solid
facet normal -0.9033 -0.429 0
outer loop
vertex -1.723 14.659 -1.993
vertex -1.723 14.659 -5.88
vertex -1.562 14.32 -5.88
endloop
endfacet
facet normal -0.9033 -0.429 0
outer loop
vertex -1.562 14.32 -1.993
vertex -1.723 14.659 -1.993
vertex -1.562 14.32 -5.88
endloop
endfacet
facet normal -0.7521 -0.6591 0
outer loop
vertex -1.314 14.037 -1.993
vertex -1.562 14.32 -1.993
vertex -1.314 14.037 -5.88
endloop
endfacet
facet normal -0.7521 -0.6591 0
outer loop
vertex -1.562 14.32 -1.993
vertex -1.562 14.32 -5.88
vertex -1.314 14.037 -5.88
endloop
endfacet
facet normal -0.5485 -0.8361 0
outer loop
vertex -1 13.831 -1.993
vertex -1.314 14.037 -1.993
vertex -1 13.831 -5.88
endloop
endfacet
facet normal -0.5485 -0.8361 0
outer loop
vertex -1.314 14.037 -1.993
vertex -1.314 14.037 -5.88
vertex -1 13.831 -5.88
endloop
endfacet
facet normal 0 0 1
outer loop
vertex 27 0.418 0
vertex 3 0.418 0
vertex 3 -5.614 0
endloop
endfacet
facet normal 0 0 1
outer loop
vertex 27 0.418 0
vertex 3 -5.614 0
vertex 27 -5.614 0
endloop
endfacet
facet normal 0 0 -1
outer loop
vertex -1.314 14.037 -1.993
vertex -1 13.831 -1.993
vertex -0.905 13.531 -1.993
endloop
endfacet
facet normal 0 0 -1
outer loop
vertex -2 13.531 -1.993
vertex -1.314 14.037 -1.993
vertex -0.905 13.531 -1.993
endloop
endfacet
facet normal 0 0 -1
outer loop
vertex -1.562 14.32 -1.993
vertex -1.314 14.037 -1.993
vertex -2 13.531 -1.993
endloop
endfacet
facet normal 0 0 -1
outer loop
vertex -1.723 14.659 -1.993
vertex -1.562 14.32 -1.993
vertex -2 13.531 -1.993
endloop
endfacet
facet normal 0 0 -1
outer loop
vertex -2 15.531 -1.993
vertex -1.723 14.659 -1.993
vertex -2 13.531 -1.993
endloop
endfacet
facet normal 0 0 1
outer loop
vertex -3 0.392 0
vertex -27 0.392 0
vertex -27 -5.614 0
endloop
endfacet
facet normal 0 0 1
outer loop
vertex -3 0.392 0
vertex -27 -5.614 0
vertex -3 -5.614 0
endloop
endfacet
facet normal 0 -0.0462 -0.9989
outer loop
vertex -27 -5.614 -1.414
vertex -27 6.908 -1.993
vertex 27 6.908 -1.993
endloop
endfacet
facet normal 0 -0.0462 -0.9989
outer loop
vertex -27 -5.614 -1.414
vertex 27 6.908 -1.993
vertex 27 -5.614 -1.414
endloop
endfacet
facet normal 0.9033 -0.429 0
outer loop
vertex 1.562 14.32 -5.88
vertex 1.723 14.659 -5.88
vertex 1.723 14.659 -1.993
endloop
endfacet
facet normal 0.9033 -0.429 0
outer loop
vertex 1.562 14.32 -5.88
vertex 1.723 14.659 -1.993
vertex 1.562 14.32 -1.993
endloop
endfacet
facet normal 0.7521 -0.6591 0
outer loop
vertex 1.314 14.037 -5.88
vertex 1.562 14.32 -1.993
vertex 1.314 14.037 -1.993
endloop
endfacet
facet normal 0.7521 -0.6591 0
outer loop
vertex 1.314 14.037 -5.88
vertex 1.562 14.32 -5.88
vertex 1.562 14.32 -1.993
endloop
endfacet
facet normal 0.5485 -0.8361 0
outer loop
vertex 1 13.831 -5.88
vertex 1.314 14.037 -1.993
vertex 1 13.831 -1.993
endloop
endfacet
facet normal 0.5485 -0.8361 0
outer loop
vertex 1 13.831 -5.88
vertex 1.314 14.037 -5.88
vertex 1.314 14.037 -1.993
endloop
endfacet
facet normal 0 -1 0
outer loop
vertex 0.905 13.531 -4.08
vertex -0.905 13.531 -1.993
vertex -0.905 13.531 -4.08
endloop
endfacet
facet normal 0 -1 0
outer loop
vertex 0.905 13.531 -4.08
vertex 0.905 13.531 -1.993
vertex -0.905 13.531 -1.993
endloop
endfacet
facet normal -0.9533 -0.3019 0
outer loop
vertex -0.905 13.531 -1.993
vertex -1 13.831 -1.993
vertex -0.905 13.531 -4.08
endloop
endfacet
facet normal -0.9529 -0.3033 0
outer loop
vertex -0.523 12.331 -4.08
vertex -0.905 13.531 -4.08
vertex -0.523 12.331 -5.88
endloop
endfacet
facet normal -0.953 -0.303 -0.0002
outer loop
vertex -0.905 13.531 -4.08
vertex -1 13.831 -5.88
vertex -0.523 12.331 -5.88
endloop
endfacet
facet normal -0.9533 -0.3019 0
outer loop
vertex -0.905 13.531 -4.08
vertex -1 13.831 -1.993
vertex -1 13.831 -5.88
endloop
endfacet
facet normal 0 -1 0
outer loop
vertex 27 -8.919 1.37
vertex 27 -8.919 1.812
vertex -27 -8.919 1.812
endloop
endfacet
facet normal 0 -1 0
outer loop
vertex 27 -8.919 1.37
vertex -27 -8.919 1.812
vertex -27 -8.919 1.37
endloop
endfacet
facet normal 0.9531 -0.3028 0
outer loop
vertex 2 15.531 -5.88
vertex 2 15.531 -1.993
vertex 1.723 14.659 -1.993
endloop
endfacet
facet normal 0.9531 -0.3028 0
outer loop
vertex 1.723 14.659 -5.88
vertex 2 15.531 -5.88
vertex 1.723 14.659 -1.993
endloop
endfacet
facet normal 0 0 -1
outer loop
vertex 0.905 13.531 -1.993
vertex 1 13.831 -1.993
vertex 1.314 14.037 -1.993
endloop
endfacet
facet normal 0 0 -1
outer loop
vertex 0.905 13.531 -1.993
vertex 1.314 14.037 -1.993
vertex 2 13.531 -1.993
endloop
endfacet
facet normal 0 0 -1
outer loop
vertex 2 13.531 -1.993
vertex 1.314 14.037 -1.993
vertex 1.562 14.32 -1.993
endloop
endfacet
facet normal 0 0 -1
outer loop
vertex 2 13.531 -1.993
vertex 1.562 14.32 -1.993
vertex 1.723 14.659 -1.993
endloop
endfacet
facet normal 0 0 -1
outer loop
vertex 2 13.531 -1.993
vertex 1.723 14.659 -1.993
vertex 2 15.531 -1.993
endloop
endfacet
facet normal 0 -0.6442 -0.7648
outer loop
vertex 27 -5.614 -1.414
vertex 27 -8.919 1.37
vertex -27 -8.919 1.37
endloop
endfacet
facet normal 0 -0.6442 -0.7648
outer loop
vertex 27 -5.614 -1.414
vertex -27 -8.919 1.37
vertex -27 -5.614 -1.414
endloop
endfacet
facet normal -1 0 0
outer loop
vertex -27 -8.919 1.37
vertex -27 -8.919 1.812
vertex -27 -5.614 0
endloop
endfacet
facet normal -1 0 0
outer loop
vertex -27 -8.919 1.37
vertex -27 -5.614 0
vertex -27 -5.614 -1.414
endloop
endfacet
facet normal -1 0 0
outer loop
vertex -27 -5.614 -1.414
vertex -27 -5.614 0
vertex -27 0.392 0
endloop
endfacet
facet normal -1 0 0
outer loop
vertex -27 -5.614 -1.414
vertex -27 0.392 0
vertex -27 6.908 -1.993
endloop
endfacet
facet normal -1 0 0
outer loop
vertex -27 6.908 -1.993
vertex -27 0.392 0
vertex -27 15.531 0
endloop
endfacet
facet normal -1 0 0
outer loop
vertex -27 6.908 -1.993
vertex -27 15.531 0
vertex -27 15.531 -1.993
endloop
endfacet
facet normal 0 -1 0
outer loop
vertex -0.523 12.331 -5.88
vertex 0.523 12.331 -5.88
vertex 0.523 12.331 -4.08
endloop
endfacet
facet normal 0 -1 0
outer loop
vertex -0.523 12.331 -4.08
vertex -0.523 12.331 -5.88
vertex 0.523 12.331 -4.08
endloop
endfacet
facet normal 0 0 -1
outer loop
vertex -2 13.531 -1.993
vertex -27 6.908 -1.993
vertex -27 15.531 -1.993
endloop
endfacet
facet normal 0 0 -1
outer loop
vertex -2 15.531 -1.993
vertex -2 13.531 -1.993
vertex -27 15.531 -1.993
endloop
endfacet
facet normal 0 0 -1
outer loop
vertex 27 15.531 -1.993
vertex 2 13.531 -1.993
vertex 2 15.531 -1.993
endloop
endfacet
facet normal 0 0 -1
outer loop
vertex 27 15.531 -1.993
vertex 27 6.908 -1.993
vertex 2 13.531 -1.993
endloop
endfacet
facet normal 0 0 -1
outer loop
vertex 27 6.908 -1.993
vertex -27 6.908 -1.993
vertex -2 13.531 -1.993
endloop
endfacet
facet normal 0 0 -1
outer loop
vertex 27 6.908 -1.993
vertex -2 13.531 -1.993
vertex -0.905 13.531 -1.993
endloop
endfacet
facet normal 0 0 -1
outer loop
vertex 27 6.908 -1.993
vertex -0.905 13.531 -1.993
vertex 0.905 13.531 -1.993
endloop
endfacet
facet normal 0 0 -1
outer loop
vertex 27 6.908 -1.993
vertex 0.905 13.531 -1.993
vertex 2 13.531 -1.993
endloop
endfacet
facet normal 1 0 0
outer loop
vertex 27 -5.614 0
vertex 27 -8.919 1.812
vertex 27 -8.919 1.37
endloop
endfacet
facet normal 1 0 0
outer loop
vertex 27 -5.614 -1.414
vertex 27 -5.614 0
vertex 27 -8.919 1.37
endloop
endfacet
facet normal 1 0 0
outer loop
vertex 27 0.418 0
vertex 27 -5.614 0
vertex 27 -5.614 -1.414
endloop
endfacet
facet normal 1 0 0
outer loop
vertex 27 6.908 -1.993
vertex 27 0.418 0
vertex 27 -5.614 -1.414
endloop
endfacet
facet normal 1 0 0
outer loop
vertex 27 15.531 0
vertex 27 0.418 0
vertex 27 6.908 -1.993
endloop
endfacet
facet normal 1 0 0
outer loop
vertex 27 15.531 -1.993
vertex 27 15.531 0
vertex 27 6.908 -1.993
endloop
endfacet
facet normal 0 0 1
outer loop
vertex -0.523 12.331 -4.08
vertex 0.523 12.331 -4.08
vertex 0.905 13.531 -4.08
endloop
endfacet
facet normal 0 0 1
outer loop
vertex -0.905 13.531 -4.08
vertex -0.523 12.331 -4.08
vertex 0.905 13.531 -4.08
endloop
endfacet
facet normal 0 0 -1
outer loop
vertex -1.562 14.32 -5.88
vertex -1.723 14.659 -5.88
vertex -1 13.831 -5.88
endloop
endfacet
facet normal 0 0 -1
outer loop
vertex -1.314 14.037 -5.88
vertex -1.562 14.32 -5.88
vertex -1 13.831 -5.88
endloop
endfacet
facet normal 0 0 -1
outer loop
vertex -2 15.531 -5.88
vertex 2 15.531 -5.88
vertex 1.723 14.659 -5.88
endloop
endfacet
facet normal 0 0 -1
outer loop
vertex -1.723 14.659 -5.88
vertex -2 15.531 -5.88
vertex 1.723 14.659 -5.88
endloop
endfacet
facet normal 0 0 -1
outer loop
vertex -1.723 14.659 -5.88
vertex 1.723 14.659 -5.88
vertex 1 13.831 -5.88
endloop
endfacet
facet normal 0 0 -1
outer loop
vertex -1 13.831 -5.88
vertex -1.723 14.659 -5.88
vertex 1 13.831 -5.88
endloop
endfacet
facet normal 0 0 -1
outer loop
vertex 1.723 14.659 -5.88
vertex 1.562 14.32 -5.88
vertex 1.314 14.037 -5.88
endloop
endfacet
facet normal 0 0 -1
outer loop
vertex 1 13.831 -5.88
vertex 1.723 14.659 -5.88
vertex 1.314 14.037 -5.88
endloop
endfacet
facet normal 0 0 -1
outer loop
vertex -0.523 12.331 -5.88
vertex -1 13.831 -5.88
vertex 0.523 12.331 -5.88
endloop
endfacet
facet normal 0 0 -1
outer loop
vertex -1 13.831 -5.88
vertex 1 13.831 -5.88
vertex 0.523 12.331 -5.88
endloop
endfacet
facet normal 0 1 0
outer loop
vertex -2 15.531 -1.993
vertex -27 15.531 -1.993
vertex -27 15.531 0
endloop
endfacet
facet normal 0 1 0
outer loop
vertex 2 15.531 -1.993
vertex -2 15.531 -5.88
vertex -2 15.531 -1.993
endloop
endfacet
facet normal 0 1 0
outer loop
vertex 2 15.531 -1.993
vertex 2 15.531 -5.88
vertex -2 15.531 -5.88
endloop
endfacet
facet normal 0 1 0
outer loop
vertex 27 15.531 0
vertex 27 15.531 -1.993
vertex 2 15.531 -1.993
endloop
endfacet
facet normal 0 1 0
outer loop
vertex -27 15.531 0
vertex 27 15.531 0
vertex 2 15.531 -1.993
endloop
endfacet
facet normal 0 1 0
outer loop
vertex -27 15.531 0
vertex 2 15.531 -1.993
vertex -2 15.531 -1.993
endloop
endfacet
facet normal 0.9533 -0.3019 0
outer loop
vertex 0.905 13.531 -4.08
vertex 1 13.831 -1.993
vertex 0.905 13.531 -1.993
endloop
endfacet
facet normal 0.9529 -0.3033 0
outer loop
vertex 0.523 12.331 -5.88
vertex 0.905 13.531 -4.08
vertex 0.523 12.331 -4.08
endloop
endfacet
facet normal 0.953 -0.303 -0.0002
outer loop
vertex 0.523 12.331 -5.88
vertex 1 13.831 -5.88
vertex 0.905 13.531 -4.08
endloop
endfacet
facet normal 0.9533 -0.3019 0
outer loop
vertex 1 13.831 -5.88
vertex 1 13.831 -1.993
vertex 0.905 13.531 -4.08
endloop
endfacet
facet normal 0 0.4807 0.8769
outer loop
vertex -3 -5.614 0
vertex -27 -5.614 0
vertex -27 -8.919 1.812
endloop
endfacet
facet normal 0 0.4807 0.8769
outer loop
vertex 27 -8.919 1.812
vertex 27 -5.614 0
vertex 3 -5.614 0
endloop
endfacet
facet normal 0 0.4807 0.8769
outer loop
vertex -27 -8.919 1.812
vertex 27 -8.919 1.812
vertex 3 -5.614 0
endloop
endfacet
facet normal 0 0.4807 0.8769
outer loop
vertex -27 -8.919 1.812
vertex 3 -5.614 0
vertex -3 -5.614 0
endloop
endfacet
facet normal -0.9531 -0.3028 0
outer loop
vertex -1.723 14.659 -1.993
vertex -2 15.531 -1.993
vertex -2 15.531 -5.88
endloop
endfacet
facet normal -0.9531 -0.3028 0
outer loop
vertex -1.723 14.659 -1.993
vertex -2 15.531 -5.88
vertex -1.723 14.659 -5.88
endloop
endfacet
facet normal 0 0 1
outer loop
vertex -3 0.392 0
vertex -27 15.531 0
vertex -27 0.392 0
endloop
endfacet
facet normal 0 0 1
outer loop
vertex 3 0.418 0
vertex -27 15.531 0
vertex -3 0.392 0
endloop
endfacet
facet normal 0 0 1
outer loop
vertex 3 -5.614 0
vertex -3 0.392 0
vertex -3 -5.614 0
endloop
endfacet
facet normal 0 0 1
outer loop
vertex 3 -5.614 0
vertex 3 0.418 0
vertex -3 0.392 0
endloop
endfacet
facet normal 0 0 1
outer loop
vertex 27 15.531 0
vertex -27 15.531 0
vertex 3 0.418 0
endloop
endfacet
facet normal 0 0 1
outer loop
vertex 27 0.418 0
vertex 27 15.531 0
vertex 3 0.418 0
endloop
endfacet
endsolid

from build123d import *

# Parameters (mm, degrees)
EXTRUDE_1_DEPTH      = 27
SKETCH_2_W           = 9
SKETCH_2_H           = 4
CUT_EXTRUDE_1_DEPTH  = 4
SKETCH_3_W           = 9
SKETCH_3_H           = 3.038101075
EXTRUDE_2_DEPTH      = 3
SKETCH_4_R           = 1.5
CUT_EXTRUDE_2_DEPTH  = 9
EXTRUDE_3_DEPTH      = 2
CUT_EXTRUDE_8_DEPTH  = 3.887469
SKETCH_8_W           = 8.610608055
SKETCH_8_H           = 13.248031464
CUT_EXTRUDE_9_DEPTH  = 54
EXTRUDE_4_DEPTH      = 54
SKETCH_12_W          = 24
SKETCH_12_H          = 6.005920689
SKETCH_12_H_2        = 6.032486627
EXTRUDE_6_DEPTH      = 2.215161
EXTRUDE_7_DEPTH      = 54
CUT_EXTRUDE_11_DEPTH = 54


with BuildPart() as part:
    # 草图1 → 凸台-拉伸1 (new body, symmetric)
    with BuildSketch(Plane(origin=(0, 0, 0), x_dir=(0, 0, -1), z_dir=(1, 0, 0))):
        Polygon((6.496390194, -5.234874936), (6.496390194, -1.191259859), (6.496390194, 1.388117725), (6.496390194, 3.400940667), (2.492073736, 5.926640843), (1.992780388, 6.907616744), (1.992780388, 8.966437233), (1.992780388, 13.434908234), (1.992780388, 15.531060696), (0, 15.531060696), (0, 13.265125064), (0, 9.02431695), (0, 5.531060696), (1.075983727, 5.531060696), (2.127060271, 3.7449116), (2.127060271, 3.316049082), (3.852001832, 3.316049082), (3.852001832, -5.234874936), align=None)
    extrude(amount=EXTRUDE_1_DEPTH, both=True)

    # 草图2 → 切除-拉伸1 (cut)
    with BuildSketch(Plane(origin=(0, 0, -6.496390194), x_dir=(-1, 0, 0), z_dir=(0, 0, -1))):
        with Locations((0, -3.734874936)):
            Rectangle(SKETCH_2_W, SKETCH_2_H)
    extrude(amount=-CUT_EXTRUDE_1_DEPTH, mode=Mode.SUBTRACT)

    # 草图3 → 凸台-拉伸2 (add)
    with BuildSketch(Plane(origin=(0, 0, -6.496390194), x_dir=(-1, 0, 0), z_dir=(0, 0, -1))):
        with Locations((0, -0.215824399)):
            Rectangle(SKETCH_3_W, SKETCH_3_H)
    extrude(amount=EXTRUDE_2_DEPTH)

    # 草图4 → 切除-拉伸2 (cut)
    with BuildSketch(Plane.XZ.offset(1.734874936)):
        with Locations((0, -6.102001832)):
            Circle(SKETCH_4_R)
    extrude(amount=-CUT_EXTRUDE_2_DEPTH, mode=Mode.SUBTRACT)

    # 草图6 → 凸台-拉伸3 (add, symmetric)
    with BuildSketch(Plane(origin=(0, 0, 0), x_dir=(0, 0, -1), z_dir=(1, 0, 0))):
        Polygon((1.880249614, 15.531060696), (5.880249614, 15.531060696), (5.880249614, 12.331060696), (4.080249614, 12.331060696), (4.080249614, 13.531060696), (2.0593477, 13.531060696), (1.880249614, 13.531060696), align=None)
    extrude(amount=EXTRUDE_3_DEPTH, both=True)

    # 草图7 → 切除-拉伸8 (cut)
    with BuildSketch(Plane(origin=(0, 0, -5.880249614), x_dir=(-1, 0, 0), z_dir=(0, 0, -1))):
        with BuildLine():
            Line((1, 13.831060696), (0.52341558, 12.331060696))
            Line((0.52341558, 12.331060696), (2, 12.331060696))
            Line((2, 12.331060696), (2, 15.531060696))
            Line((2, 15.531060696), (1.723060875, 14.659423543))
            ThreePointArc((1.723060875, 14.659423543), (1.447645575, 14.170073989), (1, 13.831060696))
        make_face()
        with BuildLine():
            ThreePointArc((-1.723060875, 14.659423543), (-1.447645575, 14.170073989), (-1, 13.831060696))
            Line((-1, 13.831060696), (-0.52341558, 12.331060696))
            Line((-0.52341558, 12.331060696), (-2, 12.331060696))
            Line((-2, 12.331060696), (-2, 15.531060696))
            Line((-2, 15.531060696), (-1.723060875, 14.659423543))
        make_face()
    extrude(amount=-CUT_EXTRUDE_8_DEPTH, mode=Mode.SUBTRACT)

    # 草图8 → 切除-拉伸9 (cut)
    with BuildSketch(Plane.ZY.offset(27)):
        with Locations((-8.09764747, -1.373941145)):
            Rectangle(SKETCH_8_W, SKETCH_8_H)
    extrude(amount=-CUT_EXTRUDE_9_DEPTH, mode=Mode.SUBTRACT)

    # 草图9 → 凸台-拉伸4 (add)
    with BuildSketch(Plane.ZY.offset(27)):
        Polygon((-2.215161152, 3.316049082), (-2.127060271, 3.316049082), (-2.215161152, 0.39188408), (-2.215161152, -5.614036609), (-3.792343442, -5.614036609), (-3.792343442, 3.316049082), align=None)
    extrude(amount=-EXTRUDE_4_DEPTH)

    # 草图12 → 凸台-拉伸6 (add)
    with BuildSketch(Plane.XY.offset(-2.215161152)):
        with Locations((-15, -2.611076265)):
            Rectangle(SKETCH_12_W, SKETCH_12_H)
        with Locations((15, -2.597793296)):
            Rectangle(SKETCH_12_W, SKETCH_12_H_2)
    extrude(amount=EXTRUDE_6_DEPTH)

    # 草图14 → 凸台-拉伸7 (add)
    with BuildSketch(Plane(origin=(27, 0, 0), x_dir=(0, 0, -1), z_dir=(1, 0, 0))):
        Polygon((0, 5.531060696), (0, 0.203028752), (0, -5.614036609), (-1.811628389, -8.919351055), (-1.370090128, -8.919351055), (1.414080713, -5.614036609), (1.992780388, 6.907616744), (0, 6.907616744), align=None)
    extrude(amount=-EXTRUDE_7_DEPTH)

    # 草图15 → 切除-拉伸11 (cut)
    with BuildSketch(Plane(origin=(27, 0, 0), x_dir=(0, 0, -1), z_dir=(1, 0, 0))):
        Polygon((1.992780388, 6.907616744), (1.414080713, -5.614036609), (3.792343442, -5.614036609), (3.792343442, 5.106503009), align=None)
    extrude(amount=-CUT_EXTRUDE_11_DEPTH, mode=Mode.SUBTRACT)


solid = part.part
